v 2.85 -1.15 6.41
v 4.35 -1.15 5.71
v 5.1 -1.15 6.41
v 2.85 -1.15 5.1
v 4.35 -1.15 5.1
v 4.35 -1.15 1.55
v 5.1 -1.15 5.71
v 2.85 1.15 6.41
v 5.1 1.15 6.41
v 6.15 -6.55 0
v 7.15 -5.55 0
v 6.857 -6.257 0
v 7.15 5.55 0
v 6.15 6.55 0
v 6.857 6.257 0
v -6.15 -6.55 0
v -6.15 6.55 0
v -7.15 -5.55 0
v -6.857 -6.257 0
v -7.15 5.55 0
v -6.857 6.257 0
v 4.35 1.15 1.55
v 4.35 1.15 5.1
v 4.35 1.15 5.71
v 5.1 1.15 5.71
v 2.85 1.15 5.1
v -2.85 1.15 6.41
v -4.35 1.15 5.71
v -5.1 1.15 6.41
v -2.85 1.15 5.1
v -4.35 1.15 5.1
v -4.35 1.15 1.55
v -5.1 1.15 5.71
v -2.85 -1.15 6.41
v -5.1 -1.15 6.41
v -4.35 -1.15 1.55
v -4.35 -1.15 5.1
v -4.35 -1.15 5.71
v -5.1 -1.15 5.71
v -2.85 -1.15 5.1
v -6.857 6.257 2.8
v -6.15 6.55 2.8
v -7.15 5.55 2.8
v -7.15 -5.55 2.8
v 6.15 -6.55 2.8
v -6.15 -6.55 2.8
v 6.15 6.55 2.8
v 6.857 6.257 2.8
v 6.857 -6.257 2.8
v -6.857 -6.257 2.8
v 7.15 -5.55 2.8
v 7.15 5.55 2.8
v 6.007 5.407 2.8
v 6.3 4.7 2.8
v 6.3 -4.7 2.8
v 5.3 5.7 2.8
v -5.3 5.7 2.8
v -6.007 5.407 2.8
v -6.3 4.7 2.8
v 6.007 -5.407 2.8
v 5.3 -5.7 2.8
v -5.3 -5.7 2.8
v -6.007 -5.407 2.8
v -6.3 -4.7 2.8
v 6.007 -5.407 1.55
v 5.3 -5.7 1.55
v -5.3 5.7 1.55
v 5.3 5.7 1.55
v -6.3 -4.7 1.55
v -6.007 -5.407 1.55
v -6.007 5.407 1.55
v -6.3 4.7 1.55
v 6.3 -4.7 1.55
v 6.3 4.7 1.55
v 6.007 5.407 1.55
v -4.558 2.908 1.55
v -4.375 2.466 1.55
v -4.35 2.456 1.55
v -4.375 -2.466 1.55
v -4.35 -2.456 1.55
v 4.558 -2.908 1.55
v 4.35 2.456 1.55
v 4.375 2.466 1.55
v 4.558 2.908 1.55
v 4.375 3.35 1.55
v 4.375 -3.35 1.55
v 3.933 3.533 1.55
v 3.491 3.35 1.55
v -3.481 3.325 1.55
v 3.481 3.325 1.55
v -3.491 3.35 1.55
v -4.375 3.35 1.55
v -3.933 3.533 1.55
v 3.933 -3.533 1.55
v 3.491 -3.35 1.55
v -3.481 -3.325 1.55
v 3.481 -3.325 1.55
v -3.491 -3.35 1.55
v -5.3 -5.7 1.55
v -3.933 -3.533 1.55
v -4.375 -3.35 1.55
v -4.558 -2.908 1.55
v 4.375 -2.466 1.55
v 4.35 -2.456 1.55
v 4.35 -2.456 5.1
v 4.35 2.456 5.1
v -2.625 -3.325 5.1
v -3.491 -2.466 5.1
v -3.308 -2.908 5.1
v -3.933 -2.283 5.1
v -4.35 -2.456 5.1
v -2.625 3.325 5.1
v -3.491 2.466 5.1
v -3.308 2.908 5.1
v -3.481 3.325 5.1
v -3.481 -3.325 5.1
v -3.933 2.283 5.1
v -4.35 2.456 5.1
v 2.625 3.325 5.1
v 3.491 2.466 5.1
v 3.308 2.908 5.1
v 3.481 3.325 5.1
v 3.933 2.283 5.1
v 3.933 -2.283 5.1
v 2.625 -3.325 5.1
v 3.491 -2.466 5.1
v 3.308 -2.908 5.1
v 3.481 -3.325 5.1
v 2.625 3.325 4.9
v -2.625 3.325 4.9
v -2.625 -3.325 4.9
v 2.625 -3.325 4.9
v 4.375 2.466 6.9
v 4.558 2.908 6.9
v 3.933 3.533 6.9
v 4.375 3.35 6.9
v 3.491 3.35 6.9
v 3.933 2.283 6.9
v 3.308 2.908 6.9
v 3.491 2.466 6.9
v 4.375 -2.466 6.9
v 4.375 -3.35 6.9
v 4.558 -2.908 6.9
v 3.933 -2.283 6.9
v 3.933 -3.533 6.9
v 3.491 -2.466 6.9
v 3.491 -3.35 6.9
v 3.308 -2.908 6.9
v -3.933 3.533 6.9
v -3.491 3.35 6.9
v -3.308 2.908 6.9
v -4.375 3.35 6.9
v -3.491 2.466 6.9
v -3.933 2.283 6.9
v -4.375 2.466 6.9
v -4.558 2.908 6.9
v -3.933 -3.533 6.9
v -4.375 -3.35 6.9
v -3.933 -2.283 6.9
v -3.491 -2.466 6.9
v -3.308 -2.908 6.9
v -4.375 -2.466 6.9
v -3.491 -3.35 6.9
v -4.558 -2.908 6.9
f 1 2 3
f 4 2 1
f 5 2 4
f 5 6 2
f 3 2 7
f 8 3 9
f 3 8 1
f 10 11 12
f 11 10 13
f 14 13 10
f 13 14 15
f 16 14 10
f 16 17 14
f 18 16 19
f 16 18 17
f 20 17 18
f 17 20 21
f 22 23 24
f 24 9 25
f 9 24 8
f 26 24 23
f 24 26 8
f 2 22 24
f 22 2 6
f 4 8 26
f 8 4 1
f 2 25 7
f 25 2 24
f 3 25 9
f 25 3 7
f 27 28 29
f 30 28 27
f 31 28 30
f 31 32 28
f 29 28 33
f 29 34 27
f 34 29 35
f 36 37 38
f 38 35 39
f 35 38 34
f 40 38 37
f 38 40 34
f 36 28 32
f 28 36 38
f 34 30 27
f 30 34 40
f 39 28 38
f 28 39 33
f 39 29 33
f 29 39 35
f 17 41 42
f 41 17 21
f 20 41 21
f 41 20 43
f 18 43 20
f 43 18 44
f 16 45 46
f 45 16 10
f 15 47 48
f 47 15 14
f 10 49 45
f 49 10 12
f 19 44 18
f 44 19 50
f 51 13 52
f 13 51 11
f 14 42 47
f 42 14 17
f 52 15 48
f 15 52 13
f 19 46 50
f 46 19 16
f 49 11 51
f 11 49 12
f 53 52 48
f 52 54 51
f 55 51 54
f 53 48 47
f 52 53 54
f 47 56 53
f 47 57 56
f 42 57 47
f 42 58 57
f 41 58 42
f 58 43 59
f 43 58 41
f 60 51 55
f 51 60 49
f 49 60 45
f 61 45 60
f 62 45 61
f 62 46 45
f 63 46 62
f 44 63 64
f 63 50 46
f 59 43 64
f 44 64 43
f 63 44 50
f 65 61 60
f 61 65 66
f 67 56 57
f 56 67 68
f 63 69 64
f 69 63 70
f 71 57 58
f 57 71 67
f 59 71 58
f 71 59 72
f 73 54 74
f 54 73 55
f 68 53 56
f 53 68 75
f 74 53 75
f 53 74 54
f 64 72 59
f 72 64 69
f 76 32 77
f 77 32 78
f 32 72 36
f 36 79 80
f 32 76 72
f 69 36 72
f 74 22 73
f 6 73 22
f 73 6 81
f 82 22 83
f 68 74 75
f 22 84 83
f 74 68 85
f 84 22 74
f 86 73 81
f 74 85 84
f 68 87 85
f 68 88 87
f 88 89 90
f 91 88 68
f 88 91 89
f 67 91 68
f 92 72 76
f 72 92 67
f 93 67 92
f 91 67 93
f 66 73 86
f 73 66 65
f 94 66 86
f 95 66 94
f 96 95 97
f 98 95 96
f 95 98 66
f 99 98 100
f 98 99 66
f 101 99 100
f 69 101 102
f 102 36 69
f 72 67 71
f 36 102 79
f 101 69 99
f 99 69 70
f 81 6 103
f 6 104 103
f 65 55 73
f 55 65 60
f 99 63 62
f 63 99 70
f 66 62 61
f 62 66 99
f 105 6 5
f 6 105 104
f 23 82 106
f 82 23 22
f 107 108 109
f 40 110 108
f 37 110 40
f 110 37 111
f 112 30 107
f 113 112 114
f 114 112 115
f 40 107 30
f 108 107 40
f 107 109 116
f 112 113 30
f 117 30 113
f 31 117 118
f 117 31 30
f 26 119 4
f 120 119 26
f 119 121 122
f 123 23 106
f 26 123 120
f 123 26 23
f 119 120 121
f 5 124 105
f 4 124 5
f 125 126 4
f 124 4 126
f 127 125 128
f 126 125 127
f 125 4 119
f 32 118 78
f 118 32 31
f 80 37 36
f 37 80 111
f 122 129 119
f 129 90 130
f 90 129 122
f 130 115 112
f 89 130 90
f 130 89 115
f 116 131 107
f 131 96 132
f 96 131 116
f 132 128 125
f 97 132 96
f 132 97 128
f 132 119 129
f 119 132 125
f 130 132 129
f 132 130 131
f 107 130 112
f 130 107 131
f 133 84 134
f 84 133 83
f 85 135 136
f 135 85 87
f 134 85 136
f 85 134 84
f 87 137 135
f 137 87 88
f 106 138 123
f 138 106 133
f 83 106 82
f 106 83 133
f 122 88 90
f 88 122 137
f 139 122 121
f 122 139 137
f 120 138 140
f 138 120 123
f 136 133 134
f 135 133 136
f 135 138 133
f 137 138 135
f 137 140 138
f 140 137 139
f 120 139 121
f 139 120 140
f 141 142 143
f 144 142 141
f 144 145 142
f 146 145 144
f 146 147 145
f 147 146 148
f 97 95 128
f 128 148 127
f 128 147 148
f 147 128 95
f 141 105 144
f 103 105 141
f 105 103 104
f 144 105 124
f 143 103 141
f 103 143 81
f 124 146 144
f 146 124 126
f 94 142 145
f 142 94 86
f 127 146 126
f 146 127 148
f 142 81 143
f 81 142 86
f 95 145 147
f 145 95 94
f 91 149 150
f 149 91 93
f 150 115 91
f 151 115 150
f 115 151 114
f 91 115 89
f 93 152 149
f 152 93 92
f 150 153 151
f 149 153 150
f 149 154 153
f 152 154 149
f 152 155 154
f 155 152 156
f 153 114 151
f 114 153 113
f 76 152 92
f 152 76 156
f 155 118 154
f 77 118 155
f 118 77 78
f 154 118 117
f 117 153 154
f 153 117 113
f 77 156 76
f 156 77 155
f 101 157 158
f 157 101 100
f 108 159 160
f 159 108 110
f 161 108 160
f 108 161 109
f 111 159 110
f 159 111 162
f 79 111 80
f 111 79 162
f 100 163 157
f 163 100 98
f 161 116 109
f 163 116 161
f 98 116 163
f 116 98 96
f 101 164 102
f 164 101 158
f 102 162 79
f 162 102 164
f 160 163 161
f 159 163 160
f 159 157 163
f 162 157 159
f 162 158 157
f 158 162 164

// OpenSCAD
// file: mcad/boxes.scad
// Library: boxes.scad
// Version: 1.0
// Author: Marius Kintel
// Copyright: 2010
// License: BSD

// roundedBox([width, height, depth], float radius, bool sidesonly);

// EXAMPLE USAGE:
// roundedBox([20, 30, 40], 5, true);

// size is a vector [w, h, d]
module roundedBox(size, radius, sidesonly)
{
  off=[size[0]/2-radius, size[1]/2-radius, size[2]/2-radius];
  hull()
  if (sidesonly) {
    for(x=[-1,1], y=[-1,1])
    translate([x*off[0], y*off[1], 0])
    cylinder(r=radius, h=size[2], center=true);
  } else {
    for(x=[-1,1], y=[-1,1], z=[-1,1])
    translate([x*off[0], y*off[1], z*off[2]])
    sphere(r=radius);
  }
}
// main file
$fn = 8;
include  <mcad/boxes.scad>;

// editable variables
keywidth = 14.3;
keydepth = 13.1;
basewidth = 9.2 -.5;
basedepth = 7.15 -.5;

//static variables
keyheight = 2.8;
borderinset = 1.55;
borderthickness = 0.85;
baseheight = 5.1;
basecutoutwidth = 5.25;
basecutoutdepth = basedepth;
basecutoutheight = .2;
baseclipwidth = 2.3;
baseclipdepth = 1.5;
baseclipheight = 6.41;
postdiameter = 1.25;
postheight = 6.9;
cornerdiameter = 1;

//main
base_keyclips();
difference(){
    union(){
    keytop();
    keybase();
    }
//label();
}
base_cornerposts();


module keytop() {
    difference() {
        keytopstock();
        translate([0,0,borderinset])
        border_cutout();
    }
}
module keytopstock() {
        translate([0, 0, keyheight/2])
        roundedBox([keywidth,keydepth,keyheight],cornerdiameter, true);
}

module border_cutout() {
    translate([0, 0, borderinset/2])
    roundedBox([keywidth-borderthickness*2,keydepth-borderthickness*2,borderinset], cornerdiameter, true);
}

module keybase() {
        difference() {
            base_stock();
            translate([0,0,basecutoutheight])
            base_cutout();
        }
}

module base_stock() { 
    translate([0, 0, baseheight/2])
    cube([basewidth,basedepth,baseheight],true);
}

module base_cutout() {
    translate([0,0, baseheight-(1.5*basecutoutheight)])
    cube([basecutoutwidth, basecutoutdepth, basecutoutheight], true);
}

module base_keyclip() {
    rotate([0,0,270]){
    translate([0,0,baseclipheight/2]){
    cube([baseclipwidth,baseclipdepth,baseclipheight], true);
    }
    translate([0,baseclipdepth/2,baseclipheight-.35]){
    cube([baseclipwidth,1.5,.7], true);}}
}


module base_keyclips() {
    translate([basewidth/2-baseclipdepth/2, 0, 0]){
    base_keyclip();}
    rotate([0,0,180]){translate([basewidth/2-baseclipdepth/2, 0, 0]){
    base_keyclip();}}
}

/*
module base_keyclip() {
    rotate([0,0,270]){
    translate([0,0,baseclipheight/2]){
    cube([baseclipwidth,baseclipdepth,baseclipheight], true);
    }
    translate([0,baseclipdepth/2,baseclipheight-.8]){
    rotate([90,0,90]){cylinder(h=baseclipwidth, d=1.6, center =true);}}
}
}


module base_keyclip() {
    translate([0,0,baseclipheight/2]){
    cube([baseclipwidth,baseclipdepth,baseclipheight], true);
    }
    translate([0,baseclipwidth/2,baseclipheight-.76]){
    difference() {
        rotate([90,0,90]){
        cylinder(h=baseclipwidth, d=1.52,$fn=3, true);
        }
        translate([0,0,-.76/2]){
        cube([baseclipwidth,10,.76], true);
        }
    }
    }
}*/


module base_single_cornerpost() {
    cylinder(h=postheight, d=postdiameter, center=true);
}

module base_cornerposts() {
    post_offset = postdiameter/3;
    translate([basewidth/2-post_offset, basedepth/2-post_offset, postheight/2]){
    base_single_cornerpost();
    }
    translate([basewidth/2-post_offset, -basedepth/2+post_offset, postheight/2]){
    base_single_cornerpost();
    }
    translate([-basewidth/2+post_offset, basedepth/2-post_offset, postheight/2]){
    base_single_cornerpost();
    }
    translate([-basewidth/2+post_offset, -basedepth/2+post_offset, postheight/2]){
    base_single_cornerpost();
    }
}

module label() {
    cylinder(h=.1, d=3.33,$fn=3, center = true);
}
